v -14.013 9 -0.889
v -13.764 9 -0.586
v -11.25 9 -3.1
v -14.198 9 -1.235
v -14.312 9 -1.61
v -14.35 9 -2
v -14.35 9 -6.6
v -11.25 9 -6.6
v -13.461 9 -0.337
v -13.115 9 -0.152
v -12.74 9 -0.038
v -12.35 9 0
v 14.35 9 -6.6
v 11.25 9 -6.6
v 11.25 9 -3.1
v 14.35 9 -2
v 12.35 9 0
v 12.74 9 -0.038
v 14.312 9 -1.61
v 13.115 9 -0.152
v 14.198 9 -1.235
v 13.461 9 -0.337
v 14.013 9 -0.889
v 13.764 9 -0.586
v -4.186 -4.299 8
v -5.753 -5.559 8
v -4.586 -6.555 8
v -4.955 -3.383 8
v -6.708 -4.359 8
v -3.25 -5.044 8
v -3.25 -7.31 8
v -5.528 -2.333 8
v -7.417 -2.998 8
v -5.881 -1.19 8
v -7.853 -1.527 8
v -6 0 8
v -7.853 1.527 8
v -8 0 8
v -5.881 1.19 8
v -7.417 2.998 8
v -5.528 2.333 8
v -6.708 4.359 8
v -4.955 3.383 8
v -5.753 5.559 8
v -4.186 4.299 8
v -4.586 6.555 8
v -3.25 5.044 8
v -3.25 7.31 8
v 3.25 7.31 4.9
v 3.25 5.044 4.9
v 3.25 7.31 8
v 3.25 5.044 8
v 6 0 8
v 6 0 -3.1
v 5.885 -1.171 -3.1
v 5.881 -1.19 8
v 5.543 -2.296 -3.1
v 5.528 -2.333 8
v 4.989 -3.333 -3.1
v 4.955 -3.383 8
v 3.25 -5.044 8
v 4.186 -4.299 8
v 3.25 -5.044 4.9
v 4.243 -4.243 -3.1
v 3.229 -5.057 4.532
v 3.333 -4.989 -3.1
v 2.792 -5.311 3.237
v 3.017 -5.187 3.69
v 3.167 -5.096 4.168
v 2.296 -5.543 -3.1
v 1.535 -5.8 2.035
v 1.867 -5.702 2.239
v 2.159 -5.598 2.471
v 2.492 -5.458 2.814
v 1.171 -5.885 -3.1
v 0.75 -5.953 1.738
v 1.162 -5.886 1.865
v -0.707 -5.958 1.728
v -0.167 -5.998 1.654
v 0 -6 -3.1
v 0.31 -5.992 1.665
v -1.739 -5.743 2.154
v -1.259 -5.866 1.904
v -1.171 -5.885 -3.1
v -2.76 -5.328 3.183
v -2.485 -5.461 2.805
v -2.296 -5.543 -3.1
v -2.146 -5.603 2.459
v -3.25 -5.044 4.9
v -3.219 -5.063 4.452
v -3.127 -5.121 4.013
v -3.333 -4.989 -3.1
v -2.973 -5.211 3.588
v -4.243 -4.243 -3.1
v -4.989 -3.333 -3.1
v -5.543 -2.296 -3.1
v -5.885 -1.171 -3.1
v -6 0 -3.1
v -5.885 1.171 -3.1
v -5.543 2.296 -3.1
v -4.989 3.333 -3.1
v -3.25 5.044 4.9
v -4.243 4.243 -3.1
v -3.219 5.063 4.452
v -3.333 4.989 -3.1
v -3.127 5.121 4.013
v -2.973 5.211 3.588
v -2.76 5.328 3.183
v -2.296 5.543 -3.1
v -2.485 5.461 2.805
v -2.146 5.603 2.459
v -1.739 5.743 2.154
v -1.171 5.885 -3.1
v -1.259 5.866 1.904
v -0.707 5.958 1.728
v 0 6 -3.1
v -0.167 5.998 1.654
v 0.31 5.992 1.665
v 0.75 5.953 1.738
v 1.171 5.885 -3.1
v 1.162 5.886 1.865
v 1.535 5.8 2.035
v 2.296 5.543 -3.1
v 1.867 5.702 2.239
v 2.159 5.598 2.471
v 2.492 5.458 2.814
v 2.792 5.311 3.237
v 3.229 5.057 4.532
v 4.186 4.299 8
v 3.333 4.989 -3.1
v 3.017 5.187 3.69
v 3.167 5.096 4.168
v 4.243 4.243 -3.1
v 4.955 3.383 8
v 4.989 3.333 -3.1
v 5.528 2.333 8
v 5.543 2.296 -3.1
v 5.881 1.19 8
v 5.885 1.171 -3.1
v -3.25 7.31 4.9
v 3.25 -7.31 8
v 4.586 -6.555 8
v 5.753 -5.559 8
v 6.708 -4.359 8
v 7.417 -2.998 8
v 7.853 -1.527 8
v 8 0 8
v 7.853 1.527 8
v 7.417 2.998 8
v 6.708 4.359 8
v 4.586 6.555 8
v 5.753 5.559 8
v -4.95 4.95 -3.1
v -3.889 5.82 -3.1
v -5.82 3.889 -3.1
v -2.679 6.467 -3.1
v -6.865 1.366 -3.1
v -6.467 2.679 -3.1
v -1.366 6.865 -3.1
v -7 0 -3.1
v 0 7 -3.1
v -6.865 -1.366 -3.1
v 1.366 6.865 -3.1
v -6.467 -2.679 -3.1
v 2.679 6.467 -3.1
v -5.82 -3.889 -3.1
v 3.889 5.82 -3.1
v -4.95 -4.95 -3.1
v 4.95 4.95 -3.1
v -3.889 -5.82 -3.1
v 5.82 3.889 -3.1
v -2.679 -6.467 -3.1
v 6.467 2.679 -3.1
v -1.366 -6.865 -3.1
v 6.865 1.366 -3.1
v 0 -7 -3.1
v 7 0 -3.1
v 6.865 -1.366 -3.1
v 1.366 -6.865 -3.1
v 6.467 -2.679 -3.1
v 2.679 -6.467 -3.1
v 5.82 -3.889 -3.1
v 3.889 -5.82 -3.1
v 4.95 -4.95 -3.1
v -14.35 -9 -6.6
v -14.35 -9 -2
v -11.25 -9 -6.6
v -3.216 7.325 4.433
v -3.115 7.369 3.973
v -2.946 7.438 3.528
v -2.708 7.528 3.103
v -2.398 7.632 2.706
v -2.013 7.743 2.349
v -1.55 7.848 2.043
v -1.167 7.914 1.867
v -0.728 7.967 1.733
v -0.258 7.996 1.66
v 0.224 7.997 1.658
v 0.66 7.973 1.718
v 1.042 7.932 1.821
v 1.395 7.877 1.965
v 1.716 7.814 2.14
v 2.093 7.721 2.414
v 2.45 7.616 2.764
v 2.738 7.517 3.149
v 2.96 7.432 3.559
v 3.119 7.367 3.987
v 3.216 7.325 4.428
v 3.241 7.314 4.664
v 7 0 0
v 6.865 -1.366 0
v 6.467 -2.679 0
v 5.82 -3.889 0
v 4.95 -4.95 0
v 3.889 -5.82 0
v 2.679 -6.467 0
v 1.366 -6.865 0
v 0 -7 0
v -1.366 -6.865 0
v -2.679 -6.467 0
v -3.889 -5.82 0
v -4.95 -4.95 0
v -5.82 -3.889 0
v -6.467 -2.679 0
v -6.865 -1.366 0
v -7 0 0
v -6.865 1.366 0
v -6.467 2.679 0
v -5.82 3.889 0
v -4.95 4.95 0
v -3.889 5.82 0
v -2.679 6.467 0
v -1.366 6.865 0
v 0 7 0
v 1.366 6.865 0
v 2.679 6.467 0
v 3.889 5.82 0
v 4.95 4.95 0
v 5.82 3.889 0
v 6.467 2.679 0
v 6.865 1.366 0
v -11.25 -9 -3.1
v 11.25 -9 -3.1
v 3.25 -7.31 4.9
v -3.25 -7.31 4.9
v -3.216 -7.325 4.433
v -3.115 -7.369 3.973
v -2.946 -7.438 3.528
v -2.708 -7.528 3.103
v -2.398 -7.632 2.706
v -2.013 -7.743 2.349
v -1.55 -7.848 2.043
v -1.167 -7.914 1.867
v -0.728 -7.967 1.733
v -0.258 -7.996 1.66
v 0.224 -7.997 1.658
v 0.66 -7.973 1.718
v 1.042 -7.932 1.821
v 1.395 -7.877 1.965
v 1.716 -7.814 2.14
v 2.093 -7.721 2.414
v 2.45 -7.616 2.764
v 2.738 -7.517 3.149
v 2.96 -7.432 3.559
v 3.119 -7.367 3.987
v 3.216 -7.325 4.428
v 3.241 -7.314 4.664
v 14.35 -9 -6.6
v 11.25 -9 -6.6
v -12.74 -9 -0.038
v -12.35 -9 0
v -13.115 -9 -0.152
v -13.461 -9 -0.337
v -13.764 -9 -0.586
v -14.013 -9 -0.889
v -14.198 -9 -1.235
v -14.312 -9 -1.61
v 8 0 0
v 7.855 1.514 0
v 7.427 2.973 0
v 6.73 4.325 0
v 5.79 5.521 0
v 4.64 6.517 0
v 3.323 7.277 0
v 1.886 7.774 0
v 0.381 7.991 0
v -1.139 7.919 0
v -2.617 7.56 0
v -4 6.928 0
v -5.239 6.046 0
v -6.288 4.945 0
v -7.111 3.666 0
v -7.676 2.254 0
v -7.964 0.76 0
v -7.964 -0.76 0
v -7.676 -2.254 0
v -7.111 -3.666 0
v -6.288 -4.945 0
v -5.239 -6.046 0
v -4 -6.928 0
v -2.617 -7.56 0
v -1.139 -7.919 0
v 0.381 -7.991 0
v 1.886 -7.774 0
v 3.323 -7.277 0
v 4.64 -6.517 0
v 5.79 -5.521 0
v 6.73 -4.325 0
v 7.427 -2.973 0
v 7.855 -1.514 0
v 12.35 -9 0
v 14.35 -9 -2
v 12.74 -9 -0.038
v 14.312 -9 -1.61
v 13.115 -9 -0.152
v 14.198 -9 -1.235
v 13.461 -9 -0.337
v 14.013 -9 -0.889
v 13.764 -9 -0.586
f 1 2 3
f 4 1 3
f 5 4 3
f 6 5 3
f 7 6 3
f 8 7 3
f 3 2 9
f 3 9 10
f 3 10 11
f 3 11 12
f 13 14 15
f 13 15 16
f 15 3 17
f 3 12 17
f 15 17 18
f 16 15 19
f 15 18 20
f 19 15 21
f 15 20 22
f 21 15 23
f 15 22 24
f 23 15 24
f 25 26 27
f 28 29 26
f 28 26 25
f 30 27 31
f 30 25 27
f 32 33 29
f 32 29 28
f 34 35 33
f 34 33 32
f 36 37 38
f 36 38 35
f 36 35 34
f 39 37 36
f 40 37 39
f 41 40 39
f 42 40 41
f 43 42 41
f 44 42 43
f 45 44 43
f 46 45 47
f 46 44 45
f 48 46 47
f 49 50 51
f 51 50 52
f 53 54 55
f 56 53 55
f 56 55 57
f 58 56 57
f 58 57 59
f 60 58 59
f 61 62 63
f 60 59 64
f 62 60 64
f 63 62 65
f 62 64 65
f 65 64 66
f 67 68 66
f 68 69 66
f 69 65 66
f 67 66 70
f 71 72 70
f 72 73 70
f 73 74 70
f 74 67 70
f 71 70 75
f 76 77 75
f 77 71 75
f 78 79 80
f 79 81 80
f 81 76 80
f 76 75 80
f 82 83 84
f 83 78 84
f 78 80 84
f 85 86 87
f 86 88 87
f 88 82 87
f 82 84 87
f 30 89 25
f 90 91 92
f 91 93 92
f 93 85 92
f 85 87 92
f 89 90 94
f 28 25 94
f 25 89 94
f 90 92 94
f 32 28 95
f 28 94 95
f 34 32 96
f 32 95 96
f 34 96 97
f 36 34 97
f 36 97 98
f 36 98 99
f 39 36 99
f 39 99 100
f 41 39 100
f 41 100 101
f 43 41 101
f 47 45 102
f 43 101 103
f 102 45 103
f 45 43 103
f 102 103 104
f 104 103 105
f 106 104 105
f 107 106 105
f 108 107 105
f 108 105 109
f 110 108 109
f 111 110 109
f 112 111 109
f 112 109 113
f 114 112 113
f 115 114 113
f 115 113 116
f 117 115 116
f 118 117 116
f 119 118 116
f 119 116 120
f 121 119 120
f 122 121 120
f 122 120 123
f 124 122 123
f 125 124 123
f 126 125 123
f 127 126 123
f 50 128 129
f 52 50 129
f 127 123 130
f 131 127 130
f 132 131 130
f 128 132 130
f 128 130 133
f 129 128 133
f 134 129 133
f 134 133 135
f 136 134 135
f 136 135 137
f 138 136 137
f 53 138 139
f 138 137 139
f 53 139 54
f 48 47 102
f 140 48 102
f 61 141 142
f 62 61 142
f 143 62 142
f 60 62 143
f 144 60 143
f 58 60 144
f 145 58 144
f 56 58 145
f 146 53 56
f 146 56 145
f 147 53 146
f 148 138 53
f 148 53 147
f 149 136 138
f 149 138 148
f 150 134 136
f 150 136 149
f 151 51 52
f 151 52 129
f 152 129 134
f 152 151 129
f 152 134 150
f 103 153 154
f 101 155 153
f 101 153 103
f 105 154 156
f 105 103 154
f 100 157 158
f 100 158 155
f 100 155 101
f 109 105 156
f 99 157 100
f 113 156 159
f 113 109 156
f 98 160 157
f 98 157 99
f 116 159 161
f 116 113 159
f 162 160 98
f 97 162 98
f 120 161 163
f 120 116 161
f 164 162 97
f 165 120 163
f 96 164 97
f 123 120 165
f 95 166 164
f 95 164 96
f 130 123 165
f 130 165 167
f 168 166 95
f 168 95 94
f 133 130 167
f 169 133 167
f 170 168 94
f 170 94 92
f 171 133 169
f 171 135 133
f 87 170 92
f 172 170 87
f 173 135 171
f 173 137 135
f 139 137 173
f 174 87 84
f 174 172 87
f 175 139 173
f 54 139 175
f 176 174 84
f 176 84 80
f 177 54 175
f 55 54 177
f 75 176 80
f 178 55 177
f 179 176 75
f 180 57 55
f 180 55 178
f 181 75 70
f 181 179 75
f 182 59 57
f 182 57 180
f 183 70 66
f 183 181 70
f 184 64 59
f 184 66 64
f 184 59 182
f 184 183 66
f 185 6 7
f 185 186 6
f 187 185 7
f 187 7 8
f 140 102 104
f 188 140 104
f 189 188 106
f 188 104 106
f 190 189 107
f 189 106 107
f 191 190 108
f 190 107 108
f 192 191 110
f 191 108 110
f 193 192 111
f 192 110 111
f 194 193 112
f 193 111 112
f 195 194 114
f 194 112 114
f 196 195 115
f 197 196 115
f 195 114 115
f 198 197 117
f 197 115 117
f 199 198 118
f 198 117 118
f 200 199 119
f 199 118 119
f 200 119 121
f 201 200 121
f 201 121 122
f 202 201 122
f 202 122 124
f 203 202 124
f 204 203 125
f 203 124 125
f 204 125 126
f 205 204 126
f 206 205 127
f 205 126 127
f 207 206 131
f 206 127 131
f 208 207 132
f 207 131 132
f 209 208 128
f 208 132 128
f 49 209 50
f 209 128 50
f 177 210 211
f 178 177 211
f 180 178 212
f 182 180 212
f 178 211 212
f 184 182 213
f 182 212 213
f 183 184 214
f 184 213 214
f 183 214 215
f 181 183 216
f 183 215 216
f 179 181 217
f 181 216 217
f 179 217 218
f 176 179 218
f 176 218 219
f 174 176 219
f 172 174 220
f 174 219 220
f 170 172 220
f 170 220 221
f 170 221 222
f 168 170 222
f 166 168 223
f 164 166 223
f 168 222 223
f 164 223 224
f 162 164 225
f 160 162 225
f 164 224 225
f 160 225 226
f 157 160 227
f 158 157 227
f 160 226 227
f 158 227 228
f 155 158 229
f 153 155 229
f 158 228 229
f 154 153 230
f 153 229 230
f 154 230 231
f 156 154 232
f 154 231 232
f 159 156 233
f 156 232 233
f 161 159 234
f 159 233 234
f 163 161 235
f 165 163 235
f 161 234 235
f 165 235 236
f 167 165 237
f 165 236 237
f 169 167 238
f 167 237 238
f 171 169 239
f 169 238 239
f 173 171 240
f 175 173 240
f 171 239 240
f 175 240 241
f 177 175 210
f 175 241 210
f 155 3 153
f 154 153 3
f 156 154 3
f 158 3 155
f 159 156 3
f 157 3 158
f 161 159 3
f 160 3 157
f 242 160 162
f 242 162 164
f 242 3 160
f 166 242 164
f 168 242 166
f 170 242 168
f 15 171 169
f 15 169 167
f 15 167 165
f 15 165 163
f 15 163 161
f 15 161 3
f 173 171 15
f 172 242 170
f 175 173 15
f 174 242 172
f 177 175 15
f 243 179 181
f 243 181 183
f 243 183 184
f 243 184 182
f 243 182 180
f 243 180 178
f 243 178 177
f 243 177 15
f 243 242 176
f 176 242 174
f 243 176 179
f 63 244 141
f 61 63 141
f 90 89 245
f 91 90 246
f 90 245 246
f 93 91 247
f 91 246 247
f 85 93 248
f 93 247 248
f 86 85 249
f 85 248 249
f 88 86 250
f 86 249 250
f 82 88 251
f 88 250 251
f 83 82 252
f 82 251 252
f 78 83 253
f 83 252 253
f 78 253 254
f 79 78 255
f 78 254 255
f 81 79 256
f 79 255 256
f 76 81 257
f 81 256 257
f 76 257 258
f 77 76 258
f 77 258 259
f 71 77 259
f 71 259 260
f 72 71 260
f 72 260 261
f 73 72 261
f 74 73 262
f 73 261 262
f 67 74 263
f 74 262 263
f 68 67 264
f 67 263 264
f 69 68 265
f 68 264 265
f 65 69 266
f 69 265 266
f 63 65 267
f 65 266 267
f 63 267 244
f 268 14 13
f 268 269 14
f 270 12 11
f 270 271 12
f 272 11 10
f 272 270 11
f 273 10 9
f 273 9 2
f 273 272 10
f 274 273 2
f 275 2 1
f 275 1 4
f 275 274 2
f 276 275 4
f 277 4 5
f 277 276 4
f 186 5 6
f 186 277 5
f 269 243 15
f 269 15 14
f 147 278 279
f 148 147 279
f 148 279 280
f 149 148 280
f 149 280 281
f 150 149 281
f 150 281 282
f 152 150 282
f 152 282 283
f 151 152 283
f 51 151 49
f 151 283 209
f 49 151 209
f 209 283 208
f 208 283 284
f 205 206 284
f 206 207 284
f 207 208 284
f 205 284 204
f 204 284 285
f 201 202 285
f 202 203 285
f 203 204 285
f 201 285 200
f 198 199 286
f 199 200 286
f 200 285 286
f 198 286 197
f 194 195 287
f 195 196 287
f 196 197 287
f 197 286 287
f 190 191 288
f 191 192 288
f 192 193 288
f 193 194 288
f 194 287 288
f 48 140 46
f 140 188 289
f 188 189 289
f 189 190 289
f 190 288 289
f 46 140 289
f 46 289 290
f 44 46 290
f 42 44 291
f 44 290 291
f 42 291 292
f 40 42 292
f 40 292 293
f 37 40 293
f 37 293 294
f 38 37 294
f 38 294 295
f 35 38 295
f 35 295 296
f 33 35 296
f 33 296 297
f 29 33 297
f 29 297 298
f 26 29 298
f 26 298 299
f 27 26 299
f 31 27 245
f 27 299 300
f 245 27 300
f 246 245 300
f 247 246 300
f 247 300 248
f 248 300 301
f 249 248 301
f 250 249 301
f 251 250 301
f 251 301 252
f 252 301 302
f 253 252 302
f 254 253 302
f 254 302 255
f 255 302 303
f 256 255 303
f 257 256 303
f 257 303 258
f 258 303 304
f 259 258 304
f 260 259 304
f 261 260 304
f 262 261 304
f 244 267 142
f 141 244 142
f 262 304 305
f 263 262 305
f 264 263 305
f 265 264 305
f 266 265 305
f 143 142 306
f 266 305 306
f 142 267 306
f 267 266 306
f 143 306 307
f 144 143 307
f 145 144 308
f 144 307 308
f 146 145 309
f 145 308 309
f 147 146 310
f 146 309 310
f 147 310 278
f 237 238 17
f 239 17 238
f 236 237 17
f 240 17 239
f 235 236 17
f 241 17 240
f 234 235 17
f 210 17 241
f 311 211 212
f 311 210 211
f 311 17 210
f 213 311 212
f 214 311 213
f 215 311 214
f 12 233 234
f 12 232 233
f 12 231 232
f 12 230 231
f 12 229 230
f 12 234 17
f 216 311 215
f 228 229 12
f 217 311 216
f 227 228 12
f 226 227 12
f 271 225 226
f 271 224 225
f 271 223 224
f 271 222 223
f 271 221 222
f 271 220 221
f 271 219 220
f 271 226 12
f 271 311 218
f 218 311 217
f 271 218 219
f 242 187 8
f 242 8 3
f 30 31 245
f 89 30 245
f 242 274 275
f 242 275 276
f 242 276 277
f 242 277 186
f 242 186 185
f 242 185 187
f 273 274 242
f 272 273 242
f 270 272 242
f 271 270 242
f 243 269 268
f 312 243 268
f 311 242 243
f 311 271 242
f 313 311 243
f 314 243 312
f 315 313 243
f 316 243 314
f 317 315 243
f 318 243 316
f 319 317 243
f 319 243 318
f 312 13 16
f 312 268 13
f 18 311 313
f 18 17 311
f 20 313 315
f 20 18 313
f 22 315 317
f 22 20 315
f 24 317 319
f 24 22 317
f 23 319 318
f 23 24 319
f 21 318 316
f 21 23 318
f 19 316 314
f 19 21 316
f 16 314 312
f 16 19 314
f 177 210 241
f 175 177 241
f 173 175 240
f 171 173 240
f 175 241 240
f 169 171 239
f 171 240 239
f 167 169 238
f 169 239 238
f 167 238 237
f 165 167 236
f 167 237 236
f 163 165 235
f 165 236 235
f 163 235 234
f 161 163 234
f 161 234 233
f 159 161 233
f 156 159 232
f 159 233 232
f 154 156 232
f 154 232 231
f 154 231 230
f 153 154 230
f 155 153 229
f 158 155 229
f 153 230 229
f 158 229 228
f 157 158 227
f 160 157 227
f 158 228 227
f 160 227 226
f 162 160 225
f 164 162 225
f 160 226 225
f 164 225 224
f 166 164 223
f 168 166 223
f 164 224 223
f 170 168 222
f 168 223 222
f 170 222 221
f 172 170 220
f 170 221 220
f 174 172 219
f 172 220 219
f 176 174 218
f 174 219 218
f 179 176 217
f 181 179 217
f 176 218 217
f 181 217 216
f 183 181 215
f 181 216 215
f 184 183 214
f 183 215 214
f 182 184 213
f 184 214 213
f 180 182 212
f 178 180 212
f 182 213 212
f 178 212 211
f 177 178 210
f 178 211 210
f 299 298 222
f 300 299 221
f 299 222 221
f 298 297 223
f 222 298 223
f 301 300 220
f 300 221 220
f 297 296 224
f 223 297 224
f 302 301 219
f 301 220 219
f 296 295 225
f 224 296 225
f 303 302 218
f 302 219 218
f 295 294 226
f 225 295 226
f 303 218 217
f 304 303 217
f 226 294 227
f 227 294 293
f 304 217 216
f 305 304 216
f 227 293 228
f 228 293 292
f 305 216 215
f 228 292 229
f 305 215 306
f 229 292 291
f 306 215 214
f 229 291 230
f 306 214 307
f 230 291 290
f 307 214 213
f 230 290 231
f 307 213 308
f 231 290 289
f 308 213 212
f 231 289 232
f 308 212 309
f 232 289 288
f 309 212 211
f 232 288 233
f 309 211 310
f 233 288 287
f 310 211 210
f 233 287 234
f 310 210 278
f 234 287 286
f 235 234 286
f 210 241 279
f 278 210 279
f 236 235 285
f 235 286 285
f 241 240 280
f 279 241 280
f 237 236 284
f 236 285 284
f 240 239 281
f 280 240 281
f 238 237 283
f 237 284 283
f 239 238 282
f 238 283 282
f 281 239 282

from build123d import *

# Parameters (mm, degrees)
F1_DEPTH  = 9
F2_R      = 2
F3_R      = 7
F4_DEPTH  = 3.1
F5_R      = 8
F5_R_2    = 5
F6_DEPTH  = 8
F7_R      = 7
F7_R_2    = 5
F8_DEPTH  = 3.1
F10_DEPTH = 12.5
F11_R     = 6
F12_DEPTH = 11.1010001


with BuildPart() as f1:
    # F0 (on Front) → F1 (new body, symmetric)
    with BuildSketch(Plane.XZ):
        Polygon((14.35, 0), (-14.35, 0), (-14.35, -6.6), (-11.25, -6.6), (-11.25, -3.1), (11.25, -3.1), (11.25, -6.6), (14.35, -6.6), align=None)
    extrude(amount=F1_DEPTH, both=True)

    # F2
    f2_edges = [f1.edges().sort_by_distance(p)[0] for p in [
        (-14.35, 0, 0),
        (14.35, 0, 0),
    ]]
    fillet(f2_edges, radius=F2_R)

    # F3 (on face) → F4 (cut, through all)
    with BuildSketch(Plane.XY):
        Circle(F3_R)
    extrude(amount=-F4_DEPTH, mode=Mode.SUBTRACT)


with BuildPart() as f6:
    # F5 (on face) → F6 (new body)
    with BuildSketch(Plane.XY):
        Circle(F5_R)
        Circle(F5_R_2, mode=Mode.SUBTRACT)
    extrude(amount=F6_DEPTH)

    # F7 (on face) → F8 (join, through all)
    with BuildSketch(Plane(origin=(0, 0, 0), x_dir=(1, 0, 0), z_dir=(0, 0, -1))):
        Circle(F7_R)
        Circle(F7_R_2, mode=Mode.SUBTRACT)
    extrude(amount=F8_DEPTH)

    # F9 (on Front) → F10 (cut, symmetric)
    with BuildSketch(Plane.XZ):
        with BuildLine():
            Line((-3.25, 8), (-3.25, 4.9))
            ThreePointArc((-3.25, 4.9), (0, 1.65), (3.25, 4.9))
            Line((3.25, 4.9), (3.25, 8))
            Line((3.25, 8), (-3.25, 8))
        make_face()
    extrude(amount=F10_DEPTH, both=True, mode=Mode.SUBTRACT)

    # F11 (on face) → F12 (cut, through all)
    with BuildSketch(Plane(origin=(0, 0, -3.1), x_dir=(1, 0, 0), z_dir=(0, 0, -1))):
        Circle(F11_R)
    extrude(amount=-F12_DEPTH, mode=Mode.SUBTRACT)


solid = Compound([f1.part, f6.part])
